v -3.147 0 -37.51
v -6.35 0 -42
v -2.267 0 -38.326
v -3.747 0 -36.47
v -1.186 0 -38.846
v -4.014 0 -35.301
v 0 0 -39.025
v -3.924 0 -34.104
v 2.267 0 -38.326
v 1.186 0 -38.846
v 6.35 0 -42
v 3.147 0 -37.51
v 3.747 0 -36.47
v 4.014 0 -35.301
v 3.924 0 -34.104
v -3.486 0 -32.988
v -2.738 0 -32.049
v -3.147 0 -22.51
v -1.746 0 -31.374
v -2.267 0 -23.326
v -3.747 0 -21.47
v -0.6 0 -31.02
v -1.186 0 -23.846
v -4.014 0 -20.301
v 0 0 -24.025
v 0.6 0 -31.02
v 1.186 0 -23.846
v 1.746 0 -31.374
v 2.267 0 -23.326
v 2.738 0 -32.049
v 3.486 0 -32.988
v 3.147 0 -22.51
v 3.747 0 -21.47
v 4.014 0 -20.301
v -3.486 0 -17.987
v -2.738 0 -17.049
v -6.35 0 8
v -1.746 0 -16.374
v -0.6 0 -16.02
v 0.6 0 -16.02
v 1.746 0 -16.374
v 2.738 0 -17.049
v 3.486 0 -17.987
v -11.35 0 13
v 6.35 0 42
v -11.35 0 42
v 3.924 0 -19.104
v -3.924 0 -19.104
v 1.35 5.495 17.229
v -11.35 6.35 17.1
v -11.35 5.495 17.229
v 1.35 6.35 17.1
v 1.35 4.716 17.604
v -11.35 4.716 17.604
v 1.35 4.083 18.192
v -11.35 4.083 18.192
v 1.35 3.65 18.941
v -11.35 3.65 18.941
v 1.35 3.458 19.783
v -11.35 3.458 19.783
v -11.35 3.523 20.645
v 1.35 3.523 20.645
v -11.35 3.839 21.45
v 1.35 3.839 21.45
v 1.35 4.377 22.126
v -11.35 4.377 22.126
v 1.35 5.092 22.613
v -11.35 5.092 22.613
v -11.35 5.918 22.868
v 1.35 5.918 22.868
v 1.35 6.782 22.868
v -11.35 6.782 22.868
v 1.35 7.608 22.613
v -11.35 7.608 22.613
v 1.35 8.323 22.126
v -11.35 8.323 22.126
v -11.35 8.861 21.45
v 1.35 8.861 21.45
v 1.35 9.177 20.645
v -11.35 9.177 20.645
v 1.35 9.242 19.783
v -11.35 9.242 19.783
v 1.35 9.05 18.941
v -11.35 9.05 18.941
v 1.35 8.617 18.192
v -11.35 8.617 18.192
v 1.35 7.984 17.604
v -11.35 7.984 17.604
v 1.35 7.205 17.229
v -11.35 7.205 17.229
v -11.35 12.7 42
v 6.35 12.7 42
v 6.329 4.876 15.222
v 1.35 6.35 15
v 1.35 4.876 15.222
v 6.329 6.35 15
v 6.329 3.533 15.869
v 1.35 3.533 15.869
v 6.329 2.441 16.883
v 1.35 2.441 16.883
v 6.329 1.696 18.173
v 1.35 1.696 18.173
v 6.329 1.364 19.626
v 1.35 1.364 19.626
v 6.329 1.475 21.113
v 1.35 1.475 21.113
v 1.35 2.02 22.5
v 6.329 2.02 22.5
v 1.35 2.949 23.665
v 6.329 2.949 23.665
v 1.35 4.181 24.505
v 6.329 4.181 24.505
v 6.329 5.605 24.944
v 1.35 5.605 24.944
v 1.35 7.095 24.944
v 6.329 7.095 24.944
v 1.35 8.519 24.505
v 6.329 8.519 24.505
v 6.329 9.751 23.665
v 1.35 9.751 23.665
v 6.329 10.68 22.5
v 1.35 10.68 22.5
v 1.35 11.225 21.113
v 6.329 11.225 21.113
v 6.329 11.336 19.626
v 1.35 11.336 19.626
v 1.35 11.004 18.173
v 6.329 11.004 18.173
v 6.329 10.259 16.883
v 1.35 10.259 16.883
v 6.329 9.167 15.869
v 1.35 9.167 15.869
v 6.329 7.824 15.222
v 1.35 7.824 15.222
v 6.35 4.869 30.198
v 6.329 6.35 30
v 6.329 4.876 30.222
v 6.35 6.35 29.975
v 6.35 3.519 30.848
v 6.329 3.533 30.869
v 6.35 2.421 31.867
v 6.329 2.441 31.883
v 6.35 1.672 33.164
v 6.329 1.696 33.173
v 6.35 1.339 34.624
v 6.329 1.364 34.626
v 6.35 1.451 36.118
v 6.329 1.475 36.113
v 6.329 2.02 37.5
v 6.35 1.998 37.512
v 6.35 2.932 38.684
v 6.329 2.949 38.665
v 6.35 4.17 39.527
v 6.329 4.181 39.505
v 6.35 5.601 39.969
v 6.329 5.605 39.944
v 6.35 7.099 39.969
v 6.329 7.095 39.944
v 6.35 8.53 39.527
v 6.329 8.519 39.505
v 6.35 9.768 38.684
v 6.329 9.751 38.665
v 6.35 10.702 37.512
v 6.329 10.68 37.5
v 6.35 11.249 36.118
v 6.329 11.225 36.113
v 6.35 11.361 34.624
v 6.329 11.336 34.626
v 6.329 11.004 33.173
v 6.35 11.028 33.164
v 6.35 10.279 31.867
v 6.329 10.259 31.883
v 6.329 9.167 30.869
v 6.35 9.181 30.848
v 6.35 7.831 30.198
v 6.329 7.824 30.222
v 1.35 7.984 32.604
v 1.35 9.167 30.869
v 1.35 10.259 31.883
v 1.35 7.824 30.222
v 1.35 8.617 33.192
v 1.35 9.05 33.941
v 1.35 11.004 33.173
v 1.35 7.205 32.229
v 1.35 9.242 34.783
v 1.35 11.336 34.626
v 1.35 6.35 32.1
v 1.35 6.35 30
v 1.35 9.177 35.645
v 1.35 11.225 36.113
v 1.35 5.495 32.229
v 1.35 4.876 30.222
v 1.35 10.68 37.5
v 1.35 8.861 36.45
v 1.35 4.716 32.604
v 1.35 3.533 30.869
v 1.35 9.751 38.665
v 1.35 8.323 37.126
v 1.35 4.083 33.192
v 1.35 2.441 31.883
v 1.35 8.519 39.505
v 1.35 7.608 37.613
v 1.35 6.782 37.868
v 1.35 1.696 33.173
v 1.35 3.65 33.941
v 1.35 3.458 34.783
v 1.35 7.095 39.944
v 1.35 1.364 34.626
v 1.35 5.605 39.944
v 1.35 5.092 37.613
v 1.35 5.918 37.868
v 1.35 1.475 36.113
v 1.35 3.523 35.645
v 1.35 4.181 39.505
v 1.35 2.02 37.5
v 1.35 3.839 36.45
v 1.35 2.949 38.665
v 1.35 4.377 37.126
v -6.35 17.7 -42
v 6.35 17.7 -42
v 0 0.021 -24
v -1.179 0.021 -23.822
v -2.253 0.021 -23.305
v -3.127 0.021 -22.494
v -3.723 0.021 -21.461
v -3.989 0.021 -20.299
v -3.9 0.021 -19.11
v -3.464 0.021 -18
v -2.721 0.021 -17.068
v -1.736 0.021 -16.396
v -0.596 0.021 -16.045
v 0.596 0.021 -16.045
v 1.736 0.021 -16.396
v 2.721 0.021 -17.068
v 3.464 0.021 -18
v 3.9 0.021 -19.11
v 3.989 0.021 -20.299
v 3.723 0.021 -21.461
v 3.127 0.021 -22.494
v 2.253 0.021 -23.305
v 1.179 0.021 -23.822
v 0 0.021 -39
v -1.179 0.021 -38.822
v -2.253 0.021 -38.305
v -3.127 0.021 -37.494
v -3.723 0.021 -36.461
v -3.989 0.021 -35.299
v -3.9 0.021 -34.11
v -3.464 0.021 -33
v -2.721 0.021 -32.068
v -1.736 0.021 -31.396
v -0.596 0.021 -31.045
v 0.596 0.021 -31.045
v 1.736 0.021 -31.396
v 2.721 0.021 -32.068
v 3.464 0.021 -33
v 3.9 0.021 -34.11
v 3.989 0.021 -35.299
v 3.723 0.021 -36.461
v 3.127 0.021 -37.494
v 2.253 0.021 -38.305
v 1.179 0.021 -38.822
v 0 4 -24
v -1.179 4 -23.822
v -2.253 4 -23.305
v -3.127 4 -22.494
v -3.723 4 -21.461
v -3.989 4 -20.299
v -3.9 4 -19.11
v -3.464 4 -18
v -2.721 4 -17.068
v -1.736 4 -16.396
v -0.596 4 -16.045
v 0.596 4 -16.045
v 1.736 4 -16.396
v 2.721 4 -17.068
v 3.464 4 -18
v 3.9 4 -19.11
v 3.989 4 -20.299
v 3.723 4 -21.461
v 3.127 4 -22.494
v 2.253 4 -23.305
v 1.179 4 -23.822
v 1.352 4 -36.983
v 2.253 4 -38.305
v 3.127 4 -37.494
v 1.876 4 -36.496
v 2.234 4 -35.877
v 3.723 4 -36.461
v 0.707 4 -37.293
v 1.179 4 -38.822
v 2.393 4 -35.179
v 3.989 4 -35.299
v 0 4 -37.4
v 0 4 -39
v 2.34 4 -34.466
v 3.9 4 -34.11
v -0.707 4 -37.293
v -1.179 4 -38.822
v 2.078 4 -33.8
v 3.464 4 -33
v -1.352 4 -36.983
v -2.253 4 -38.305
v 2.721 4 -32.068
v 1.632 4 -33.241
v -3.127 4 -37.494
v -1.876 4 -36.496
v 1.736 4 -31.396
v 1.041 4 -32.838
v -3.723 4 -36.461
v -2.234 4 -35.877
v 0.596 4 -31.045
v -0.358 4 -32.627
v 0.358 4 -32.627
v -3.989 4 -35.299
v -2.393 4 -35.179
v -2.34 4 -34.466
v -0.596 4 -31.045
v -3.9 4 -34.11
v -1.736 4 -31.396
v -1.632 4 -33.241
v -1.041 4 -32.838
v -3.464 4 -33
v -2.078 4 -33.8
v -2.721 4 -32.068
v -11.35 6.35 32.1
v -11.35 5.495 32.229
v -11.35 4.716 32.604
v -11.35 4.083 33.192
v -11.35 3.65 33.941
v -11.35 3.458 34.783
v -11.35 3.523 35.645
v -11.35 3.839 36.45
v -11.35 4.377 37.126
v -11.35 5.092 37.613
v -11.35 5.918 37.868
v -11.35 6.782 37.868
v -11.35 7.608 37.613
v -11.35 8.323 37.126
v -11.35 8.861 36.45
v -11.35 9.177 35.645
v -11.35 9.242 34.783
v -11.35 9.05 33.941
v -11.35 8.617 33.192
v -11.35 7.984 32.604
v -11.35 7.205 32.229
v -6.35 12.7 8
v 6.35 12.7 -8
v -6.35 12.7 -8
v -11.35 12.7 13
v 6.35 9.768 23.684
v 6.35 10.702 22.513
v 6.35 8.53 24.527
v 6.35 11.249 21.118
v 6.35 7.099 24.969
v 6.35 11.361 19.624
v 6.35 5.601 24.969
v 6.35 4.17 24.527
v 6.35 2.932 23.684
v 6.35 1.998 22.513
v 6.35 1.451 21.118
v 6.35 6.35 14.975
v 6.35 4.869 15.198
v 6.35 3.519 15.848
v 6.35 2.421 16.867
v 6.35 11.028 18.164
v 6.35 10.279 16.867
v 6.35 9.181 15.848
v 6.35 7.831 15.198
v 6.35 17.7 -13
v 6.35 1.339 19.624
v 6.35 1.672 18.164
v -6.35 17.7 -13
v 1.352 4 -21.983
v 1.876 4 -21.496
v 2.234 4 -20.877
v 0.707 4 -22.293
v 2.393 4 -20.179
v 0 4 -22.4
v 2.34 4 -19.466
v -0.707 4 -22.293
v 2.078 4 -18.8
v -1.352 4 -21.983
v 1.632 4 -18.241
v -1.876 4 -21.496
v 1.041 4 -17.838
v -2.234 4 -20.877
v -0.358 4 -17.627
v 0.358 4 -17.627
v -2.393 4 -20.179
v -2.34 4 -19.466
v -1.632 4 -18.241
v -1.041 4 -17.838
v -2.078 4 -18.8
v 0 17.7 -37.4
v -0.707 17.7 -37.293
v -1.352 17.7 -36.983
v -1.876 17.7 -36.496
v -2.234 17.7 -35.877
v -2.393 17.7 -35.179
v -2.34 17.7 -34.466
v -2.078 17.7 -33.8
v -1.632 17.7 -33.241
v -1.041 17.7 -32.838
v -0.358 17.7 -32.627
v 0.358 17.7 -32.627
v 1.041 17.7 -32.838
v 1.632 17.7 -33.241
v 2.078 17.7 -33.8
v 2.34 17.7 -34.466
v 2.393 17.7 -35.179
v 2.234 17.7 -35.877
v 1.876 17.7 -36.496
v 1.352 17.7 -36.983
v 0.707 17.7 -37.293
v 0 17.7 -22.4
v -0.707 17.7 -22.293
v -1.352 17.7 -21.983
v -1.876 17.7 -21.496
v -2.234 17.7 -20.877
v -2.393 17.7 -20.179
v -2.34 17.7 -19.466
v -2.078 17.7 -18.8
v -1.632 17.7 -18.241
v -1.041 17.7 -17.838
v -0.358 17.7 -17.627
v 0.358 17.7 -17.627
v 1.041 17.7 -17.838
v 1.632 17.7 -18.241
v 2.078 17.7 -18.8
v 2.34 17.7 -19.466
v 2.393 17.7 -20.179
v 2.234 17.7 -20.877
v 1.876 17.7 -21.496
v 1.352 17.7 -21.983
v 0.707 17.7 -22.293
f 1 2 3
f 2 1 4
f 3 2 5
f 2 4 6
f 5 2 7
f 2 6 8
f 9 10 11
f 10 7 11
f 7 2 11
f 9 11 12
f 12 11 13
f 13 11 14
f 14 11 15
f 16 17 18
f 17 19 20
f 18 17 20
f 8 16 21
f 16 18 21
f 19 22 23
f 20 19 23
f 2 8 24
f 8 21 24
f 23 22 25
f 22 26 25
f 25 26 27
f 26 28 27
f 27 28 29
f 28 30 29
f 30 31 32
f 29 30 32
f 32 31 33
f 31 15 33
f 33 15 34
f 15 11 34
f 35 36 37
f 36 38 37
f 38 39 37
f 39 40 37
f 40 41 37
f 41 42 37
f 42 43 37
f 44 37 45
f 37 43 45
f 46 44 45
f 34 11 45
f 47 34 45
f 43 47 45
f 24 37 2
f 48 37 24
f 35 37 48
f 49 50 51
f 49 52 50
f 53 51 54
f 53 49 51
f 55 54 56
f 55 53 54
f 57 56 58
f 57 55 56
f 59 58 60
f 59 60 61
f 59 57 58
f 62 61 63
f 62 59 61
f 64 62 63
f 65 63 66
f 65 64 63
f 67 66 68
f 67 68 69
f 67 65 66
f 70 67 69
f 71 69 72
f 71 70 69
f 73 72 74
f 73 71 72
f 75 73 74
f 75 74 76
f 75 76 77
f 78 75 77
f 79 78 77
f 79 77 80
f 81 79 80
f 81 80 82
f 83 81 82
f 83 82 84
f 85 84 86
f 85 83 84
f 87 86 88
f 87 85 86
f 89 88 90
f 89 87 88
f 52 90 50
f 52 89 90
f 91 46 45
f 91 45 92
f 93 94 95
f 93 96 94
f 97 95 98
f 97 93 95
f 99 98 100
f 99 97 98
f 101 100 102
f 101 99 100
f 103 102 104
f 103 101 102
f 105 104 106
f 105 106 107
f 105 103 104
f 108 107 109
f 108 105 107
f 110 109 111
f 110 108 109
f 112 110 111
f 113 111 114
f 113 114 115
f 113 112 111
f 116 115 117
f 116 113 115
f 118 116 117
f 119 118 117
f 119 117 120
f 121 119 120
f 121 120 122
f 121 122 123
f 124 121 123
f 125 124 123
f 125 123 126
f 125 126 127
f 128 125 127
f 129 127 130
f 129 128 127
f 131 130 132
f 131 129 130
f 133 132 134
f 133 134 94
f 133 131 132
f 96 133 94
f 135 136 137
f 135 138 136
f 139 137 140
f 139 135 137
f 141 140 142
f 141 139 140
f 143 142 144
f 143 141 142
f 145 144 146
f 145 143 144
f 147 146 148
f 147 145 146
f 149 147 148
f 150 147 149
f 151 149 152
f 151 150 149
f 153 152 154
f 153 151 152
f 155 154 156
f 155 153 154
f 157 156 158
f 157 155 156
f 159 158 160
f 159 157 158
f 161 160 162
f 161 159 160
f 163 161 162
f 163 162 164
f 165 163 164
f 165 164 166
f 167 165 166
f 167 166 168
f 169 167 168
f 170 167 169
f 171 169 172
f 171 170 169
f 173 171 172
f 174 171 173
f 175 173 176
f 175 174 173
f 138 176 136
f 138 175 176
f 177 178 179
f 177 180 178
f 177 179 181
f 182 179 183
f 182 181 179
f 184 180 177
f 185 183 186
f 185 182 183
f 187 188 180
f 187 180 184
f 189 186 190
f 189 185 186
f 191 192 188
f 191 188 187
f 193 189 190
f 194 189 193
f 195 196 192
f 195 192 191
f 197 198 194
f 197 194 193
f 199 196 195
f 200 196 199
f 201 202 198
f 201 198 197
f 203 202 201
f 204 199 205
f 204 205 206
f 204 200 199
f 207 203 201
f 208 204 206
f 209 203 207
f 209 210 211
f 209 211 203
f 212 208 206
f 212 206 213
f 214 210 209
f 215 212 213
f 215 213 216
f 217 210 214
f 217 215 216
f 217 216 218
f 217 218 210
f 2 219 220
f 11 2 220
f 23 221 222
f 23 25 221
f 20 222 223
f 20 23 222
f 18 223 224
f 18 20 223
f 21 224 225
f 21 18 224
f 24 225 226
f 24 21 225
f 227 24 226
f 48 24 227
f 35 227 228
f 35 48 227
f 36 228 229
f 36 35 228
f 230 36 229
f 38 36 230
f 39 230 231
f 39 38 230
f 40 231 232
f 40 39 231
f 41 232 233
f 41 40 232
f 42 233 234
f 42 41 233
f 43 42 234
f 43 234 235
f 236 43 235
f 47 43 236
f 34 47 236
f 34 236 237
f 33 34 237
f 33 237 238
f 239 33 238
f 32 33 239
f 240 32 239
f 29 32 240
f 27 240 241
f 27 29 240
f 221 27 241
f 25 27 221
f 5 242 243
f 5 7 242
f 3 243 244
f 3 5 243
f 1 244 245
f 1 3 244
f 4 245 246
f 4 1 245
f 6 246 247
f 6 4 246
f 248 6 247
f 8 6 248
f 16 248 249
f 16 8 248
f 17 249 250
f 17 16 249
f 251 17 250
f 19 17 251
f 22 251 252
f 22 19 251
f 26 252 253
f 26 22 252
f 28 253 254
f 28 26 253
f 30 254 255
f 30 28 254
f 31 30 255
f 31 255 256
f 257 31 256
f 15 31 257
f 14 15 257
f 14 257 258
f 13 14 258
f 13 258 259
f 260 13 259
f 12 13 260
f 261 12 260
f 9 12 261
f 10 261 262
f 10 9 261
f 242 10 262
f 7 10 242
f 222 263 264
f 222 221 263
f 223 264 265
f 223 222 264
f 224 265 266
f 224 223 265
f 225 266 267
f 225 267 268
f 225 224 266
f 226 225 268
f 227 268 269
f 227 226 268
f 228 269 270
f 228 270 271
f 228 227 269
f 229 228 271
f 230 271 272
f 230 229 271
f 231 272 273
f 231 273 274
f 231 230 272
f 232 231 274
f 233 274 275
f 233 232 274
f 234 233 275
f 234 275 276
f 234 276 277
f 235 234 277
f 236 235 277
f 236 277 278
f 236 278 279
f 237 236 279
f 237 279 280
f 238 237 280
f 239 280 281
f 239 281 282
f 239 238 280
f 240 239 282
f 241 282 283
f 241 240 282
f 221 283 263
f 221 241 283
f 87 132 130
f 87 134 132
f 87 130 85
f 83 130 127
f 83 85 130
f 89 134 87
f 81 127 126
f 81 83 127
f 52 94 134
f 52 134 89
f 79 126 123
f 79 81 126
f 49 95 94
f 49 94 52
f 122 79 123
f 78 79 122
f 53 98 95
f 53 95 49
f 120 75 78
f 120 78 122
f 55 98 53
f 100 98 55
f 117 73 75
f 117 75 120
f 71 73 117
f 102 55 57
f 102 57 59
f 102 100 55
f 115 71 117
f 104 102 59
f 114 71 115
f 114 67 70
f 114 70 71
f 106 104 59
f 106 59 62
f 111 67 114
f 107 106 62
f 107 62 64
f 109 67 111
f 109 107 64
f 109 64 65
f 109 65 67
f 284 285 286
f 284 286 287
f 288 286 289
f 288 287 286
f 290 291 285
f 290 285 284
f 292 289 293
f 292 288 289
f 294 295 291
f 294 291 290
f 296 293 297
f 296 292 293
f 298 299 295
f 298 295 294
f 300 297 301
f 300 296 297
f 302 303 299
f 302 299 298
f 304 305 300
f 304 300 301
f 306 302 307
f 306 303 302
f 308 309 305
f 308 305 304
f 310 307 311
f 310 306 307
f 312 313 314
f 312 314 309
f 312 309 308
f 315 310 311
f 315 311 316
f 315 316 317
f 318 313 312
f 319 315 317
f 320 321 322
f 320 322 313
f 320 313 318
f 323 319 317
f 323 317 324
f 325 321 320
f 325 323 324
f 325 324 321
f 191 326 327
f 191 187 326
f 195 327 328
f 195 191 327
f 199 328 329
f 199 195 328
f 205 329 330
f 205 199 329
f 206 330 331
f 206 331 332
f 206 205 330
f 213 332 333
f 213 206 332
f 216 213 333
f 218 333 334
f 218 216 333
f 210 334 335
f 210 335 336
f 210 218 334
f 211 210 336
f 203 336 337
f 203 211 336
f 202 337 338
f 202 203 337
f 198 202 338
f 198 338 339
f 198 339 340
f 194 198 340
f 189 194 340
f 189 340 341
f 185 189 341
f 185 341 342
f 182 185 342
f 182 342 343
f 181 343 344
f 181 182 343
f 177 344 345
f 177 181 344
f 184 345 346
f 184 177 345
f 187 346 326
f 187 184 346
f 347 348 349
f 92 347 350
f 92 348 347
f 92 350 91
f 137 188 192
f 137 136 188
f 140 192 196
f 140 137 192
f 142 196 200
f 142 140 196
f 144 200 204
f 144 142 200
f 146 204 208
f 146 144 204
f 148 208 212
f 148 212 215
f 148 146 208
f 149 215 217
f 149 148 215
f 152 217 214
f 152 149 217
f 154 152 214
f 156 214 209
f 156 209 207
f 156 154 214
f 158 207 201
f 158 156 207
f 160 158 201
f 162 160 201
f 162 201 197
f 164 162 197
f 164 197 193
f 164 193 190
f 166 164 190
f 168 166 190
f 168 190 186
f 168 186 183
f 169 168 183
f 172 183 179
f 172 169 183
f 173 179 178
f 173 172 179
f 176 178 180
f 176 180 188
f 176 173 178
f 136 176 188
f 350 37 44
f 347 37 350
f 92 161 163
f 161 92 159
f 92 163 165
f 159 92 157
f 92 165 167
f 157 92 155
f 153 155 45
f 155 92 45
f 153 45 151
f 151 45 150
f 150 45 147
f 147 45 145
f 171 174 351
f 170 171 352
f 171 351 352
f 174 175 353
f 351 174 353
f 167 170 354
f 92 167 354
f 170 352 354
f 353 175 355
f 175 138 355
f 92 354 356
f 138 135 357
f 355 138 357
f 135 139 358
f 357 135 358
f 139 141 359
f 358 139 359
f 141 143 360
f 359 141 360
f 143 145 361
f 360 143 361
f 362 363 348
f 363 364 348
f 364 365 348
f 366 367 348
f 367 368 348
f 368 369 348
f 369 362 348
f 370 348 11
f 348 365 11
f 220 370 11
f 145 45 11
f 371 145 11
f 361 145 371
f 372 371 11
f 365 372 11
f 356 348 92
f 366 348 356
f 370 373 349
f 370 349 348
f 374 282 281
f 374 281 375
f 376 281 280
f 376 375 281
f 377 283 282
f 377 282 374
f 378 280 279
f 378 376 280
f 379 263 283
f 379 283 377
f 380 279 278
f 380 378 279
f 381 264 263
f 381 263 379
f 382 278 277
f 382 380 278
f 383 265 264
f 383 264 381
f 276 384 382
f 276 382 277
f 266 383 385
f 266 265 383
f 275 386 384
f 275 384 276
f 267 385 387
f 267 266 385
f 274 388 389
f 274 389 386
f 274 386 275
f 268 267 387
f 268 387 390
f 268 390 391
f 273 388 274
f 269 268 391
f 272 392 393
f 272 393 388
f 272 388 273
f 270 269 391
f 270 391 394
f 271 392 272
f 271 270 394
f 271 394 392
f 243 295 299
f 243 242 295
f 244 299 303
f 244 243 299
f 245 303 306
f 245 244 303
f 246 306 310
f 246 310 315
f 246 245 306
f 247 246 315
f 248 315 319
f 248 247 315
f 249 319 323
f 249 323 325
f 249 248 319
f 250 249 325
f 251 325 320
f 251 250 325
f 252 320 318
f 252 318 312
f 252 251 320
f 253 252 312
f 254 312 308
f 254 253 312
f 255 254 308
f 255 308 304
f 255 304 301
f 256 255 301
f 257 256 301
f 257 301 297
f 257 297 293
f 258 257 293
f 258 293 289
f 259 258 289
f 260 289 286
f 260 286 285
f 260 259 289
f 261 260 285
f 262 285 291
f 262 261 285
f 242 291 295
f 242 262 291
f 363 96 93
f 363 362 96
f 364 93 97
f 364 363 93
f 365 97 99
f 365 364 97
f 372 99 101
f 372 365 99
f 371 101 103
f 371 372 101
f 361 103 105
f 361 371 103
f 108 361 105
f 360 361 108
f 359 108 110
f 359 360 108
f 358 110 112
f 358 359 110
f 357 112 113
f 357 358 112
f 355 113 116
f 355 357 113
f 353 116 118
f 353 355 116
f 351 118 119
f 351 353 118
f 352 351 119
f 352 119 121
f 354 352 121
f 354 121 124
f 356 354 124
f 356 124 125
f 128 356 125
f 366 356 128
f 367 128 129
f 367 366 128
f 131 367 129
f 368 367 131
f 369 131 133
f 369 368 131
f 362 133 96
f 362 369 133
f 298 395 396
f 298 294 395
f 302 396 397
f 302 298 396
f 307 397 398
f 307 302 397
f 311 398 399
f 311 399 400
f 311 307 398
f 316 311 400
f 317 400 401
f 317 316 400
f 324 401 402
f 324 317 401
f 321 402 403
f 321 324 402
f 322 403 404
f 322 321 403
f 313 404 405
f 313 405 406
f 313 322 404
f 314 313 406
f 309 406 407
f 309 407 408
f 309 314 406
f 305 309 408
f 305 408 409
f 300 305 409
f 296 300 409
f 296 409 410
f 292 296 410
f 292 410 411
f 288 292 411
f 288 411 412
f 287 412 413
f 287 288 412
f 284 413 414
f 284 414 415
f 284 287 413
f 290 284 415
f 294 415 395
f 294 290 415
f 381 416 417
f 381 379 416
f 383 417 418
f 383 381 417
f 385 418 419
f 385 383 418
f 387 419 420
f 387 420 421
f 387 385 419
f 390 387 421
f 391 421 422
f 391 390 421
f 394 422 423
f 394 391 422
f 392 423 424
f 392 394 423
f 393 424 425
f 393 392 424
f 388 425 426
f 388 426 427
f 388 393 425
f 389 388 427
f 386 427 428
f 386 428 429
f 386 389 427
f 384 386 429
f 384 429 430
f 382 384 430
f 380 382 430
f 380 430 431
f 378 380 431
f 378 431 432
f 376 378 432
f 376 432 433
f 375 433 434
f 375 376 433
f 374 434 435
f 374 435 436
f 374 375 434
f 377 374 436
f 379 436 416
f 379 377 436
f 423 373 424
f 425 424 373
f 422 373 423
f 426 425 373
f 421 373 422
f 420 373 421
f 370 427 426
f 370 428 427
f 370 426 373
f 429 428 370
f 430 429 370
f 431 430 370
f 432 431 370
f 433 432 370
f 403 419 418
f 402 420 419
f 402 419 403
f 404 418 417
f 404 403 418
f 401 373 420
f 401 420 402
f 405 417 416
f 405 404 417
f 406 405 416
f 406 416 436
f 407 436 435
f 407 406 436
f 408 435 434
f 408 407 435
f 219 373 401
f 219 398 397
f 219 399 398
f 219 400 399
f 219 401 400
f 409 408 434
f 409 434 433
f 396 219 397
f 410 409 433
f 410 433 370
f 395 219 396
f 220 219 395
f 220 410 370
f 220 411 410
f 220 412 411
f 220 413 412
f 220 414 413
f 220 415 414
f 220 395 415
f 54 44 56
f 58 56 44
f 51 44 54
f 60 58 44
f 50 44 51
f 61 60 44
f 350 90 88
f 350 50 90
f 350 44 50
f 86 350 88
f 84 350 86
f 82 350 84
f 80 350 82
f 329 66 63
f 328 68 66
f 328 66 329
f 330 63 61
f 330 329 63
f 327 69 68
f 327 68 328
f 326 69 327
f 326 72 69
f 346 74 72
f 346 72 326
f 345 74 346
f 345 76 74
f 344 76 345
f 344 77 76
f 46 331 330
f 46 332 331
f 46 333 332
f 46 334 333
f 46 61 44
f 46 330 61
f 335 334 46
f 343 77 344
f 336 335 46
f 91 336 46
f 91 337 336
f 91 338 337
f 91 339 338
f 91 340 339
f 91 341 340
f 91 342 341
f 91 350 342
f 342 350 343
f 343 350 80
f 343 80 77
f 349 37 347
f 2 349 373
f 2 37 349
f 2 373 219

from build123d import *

# Parameters (mm, degrees)
SKETCH2_W                     = 12.7
SKETCH2_H                     = 84
BOSS_EXTRUDE1_DEPTH           = 12.7
SKETCH5_W                     = 12.7
SKETCH5_H                     = 29
BOSS_EXTRUDE2_DEPTH           = 5
CBORE_FOR_M4_SHCS1_AT_2_COUNT = 2
CBORE_FOR_M4_SHCS1_AT_2_PITCH = 15
SKETCH8_W                     = 29
SKETCH8_H                     = 12.7
BOSS_EXTRUDE3_DEPTH           = 5
CBORE_FOR_M5_SHCS2_AT_2_COUNT = 2
CBORE_FOR_M5_SHCS2_AT_2_PITCH = 15
CHAMFER1_SIZE                 = 5


with BuildPart() as part:
    # Sketch2 → Boss-Extrude1 (new body)
    with BuildSketch(Plane(origin=(0, 0, 0), x_dir=(1, 0, 0), z_dir=(0, 1, 0))):
        Rectangle(SKETCH2_W, SKETCH2_H)
    extrude(amount=BOSS_EXTRUDE1_DEPTH)

    # Sketch5 → Boss-Extrude2 (add)
    with BuildSketch(Plane(origin=(0, 12.7, 0), x_dir=(1, 0, 0), z_dir=(0, 1, 0))):
        with Locations((0, 27.5)):
            Rectangle(SKETCH5_W, SKETCH5_H)
    extrude(amount=BOSS_EXTRUDE2_DEPTH)

    # Sketch4 → CBORE for M4 SHCS1 (revolve, cut)
    with BuildSketch(Plane(origin=(0, 0, -35), x_dir=(0, 0, -1), z_dir=(1, 0, 0))):
        Polygon((0, 0), (0, 17.7), (2.4, 17.7), (2.4, 4), (4, 4), (4, 0.020977491), (4.025, 0), align=None)
    cbore_for_m4_shcs1 = revolve(axis=Axis((0, -6.35, -35), (0, 1, 0)), mode=Mode.SUBTRACT)

    # CBORE for M4 SHCS1 at 2: CBORE for M4 SHCS1 ×2
    with Locations(*[(0, 0, i * CBORE_FOR_M4_SHCS1_AT_2_PITCH) for i in range(1, CBORE_FOR_M4_SHCS1_AT_2_COUNT)]):
        add(cbore_for_m4_shcs1, mode=Mode.SUBTRACT)

    # Sketch8 → Boss-Extrude3 (add)
    with BuildSketch(Plane.ZY.offset(6.35)):
        with Locations((27.5, 6.35)):
            Rectangle(SKETCH8_W, SKETCH8_H)
    extrude(amount=BOSS_EXTRUDE3_DEPTH)

    # Sketch7 → CBORE for M5 SHCS2 (revolve, cut)
    with BuildSketch(Plane(origin=(6.35, 6.35, 35), x_dir=(0, 0, -1), z_dir=(0, 1, 0))):
        Polygon((0, 0), (0, 17.7), (2.9, 17.7), (2.9, 5), (5, 5), (5, 0.020977491), (5.025, 0), align=None)
    cbore_for_m5_shcs2 = revolve(axis=Axis((12.7, 6.35, 35), (-1, 0, 0)), mode=Mode.SUBTRACT)

    # CBORE for M5 SHCS2 at 2: CBORE for M5 SHCS2 ×2
    with Locations(*[(0, 0, -i * CBORE_FOR_M5_SHCS2_AT_2_PITCH) for i in range(1, CBORE_FOR_M5_SHCS2_AT_2_COUNT)]):
        add(cbore_for_m5_shcs2, mode=Mode.SUBTRACT)

    # Chamfer1
    chamfer1_edges = [part.edges().sort_by_distance(p)[0] for p in [
        (0, 12.7, -13),
        (-6.35, 6.35, 13),
    ]]
    chamfer(chamfer1_edges, length=CHAMFER1_SIZE - 0.0001)  # a hair under: the kernel refuses the full size


solid = part.part
